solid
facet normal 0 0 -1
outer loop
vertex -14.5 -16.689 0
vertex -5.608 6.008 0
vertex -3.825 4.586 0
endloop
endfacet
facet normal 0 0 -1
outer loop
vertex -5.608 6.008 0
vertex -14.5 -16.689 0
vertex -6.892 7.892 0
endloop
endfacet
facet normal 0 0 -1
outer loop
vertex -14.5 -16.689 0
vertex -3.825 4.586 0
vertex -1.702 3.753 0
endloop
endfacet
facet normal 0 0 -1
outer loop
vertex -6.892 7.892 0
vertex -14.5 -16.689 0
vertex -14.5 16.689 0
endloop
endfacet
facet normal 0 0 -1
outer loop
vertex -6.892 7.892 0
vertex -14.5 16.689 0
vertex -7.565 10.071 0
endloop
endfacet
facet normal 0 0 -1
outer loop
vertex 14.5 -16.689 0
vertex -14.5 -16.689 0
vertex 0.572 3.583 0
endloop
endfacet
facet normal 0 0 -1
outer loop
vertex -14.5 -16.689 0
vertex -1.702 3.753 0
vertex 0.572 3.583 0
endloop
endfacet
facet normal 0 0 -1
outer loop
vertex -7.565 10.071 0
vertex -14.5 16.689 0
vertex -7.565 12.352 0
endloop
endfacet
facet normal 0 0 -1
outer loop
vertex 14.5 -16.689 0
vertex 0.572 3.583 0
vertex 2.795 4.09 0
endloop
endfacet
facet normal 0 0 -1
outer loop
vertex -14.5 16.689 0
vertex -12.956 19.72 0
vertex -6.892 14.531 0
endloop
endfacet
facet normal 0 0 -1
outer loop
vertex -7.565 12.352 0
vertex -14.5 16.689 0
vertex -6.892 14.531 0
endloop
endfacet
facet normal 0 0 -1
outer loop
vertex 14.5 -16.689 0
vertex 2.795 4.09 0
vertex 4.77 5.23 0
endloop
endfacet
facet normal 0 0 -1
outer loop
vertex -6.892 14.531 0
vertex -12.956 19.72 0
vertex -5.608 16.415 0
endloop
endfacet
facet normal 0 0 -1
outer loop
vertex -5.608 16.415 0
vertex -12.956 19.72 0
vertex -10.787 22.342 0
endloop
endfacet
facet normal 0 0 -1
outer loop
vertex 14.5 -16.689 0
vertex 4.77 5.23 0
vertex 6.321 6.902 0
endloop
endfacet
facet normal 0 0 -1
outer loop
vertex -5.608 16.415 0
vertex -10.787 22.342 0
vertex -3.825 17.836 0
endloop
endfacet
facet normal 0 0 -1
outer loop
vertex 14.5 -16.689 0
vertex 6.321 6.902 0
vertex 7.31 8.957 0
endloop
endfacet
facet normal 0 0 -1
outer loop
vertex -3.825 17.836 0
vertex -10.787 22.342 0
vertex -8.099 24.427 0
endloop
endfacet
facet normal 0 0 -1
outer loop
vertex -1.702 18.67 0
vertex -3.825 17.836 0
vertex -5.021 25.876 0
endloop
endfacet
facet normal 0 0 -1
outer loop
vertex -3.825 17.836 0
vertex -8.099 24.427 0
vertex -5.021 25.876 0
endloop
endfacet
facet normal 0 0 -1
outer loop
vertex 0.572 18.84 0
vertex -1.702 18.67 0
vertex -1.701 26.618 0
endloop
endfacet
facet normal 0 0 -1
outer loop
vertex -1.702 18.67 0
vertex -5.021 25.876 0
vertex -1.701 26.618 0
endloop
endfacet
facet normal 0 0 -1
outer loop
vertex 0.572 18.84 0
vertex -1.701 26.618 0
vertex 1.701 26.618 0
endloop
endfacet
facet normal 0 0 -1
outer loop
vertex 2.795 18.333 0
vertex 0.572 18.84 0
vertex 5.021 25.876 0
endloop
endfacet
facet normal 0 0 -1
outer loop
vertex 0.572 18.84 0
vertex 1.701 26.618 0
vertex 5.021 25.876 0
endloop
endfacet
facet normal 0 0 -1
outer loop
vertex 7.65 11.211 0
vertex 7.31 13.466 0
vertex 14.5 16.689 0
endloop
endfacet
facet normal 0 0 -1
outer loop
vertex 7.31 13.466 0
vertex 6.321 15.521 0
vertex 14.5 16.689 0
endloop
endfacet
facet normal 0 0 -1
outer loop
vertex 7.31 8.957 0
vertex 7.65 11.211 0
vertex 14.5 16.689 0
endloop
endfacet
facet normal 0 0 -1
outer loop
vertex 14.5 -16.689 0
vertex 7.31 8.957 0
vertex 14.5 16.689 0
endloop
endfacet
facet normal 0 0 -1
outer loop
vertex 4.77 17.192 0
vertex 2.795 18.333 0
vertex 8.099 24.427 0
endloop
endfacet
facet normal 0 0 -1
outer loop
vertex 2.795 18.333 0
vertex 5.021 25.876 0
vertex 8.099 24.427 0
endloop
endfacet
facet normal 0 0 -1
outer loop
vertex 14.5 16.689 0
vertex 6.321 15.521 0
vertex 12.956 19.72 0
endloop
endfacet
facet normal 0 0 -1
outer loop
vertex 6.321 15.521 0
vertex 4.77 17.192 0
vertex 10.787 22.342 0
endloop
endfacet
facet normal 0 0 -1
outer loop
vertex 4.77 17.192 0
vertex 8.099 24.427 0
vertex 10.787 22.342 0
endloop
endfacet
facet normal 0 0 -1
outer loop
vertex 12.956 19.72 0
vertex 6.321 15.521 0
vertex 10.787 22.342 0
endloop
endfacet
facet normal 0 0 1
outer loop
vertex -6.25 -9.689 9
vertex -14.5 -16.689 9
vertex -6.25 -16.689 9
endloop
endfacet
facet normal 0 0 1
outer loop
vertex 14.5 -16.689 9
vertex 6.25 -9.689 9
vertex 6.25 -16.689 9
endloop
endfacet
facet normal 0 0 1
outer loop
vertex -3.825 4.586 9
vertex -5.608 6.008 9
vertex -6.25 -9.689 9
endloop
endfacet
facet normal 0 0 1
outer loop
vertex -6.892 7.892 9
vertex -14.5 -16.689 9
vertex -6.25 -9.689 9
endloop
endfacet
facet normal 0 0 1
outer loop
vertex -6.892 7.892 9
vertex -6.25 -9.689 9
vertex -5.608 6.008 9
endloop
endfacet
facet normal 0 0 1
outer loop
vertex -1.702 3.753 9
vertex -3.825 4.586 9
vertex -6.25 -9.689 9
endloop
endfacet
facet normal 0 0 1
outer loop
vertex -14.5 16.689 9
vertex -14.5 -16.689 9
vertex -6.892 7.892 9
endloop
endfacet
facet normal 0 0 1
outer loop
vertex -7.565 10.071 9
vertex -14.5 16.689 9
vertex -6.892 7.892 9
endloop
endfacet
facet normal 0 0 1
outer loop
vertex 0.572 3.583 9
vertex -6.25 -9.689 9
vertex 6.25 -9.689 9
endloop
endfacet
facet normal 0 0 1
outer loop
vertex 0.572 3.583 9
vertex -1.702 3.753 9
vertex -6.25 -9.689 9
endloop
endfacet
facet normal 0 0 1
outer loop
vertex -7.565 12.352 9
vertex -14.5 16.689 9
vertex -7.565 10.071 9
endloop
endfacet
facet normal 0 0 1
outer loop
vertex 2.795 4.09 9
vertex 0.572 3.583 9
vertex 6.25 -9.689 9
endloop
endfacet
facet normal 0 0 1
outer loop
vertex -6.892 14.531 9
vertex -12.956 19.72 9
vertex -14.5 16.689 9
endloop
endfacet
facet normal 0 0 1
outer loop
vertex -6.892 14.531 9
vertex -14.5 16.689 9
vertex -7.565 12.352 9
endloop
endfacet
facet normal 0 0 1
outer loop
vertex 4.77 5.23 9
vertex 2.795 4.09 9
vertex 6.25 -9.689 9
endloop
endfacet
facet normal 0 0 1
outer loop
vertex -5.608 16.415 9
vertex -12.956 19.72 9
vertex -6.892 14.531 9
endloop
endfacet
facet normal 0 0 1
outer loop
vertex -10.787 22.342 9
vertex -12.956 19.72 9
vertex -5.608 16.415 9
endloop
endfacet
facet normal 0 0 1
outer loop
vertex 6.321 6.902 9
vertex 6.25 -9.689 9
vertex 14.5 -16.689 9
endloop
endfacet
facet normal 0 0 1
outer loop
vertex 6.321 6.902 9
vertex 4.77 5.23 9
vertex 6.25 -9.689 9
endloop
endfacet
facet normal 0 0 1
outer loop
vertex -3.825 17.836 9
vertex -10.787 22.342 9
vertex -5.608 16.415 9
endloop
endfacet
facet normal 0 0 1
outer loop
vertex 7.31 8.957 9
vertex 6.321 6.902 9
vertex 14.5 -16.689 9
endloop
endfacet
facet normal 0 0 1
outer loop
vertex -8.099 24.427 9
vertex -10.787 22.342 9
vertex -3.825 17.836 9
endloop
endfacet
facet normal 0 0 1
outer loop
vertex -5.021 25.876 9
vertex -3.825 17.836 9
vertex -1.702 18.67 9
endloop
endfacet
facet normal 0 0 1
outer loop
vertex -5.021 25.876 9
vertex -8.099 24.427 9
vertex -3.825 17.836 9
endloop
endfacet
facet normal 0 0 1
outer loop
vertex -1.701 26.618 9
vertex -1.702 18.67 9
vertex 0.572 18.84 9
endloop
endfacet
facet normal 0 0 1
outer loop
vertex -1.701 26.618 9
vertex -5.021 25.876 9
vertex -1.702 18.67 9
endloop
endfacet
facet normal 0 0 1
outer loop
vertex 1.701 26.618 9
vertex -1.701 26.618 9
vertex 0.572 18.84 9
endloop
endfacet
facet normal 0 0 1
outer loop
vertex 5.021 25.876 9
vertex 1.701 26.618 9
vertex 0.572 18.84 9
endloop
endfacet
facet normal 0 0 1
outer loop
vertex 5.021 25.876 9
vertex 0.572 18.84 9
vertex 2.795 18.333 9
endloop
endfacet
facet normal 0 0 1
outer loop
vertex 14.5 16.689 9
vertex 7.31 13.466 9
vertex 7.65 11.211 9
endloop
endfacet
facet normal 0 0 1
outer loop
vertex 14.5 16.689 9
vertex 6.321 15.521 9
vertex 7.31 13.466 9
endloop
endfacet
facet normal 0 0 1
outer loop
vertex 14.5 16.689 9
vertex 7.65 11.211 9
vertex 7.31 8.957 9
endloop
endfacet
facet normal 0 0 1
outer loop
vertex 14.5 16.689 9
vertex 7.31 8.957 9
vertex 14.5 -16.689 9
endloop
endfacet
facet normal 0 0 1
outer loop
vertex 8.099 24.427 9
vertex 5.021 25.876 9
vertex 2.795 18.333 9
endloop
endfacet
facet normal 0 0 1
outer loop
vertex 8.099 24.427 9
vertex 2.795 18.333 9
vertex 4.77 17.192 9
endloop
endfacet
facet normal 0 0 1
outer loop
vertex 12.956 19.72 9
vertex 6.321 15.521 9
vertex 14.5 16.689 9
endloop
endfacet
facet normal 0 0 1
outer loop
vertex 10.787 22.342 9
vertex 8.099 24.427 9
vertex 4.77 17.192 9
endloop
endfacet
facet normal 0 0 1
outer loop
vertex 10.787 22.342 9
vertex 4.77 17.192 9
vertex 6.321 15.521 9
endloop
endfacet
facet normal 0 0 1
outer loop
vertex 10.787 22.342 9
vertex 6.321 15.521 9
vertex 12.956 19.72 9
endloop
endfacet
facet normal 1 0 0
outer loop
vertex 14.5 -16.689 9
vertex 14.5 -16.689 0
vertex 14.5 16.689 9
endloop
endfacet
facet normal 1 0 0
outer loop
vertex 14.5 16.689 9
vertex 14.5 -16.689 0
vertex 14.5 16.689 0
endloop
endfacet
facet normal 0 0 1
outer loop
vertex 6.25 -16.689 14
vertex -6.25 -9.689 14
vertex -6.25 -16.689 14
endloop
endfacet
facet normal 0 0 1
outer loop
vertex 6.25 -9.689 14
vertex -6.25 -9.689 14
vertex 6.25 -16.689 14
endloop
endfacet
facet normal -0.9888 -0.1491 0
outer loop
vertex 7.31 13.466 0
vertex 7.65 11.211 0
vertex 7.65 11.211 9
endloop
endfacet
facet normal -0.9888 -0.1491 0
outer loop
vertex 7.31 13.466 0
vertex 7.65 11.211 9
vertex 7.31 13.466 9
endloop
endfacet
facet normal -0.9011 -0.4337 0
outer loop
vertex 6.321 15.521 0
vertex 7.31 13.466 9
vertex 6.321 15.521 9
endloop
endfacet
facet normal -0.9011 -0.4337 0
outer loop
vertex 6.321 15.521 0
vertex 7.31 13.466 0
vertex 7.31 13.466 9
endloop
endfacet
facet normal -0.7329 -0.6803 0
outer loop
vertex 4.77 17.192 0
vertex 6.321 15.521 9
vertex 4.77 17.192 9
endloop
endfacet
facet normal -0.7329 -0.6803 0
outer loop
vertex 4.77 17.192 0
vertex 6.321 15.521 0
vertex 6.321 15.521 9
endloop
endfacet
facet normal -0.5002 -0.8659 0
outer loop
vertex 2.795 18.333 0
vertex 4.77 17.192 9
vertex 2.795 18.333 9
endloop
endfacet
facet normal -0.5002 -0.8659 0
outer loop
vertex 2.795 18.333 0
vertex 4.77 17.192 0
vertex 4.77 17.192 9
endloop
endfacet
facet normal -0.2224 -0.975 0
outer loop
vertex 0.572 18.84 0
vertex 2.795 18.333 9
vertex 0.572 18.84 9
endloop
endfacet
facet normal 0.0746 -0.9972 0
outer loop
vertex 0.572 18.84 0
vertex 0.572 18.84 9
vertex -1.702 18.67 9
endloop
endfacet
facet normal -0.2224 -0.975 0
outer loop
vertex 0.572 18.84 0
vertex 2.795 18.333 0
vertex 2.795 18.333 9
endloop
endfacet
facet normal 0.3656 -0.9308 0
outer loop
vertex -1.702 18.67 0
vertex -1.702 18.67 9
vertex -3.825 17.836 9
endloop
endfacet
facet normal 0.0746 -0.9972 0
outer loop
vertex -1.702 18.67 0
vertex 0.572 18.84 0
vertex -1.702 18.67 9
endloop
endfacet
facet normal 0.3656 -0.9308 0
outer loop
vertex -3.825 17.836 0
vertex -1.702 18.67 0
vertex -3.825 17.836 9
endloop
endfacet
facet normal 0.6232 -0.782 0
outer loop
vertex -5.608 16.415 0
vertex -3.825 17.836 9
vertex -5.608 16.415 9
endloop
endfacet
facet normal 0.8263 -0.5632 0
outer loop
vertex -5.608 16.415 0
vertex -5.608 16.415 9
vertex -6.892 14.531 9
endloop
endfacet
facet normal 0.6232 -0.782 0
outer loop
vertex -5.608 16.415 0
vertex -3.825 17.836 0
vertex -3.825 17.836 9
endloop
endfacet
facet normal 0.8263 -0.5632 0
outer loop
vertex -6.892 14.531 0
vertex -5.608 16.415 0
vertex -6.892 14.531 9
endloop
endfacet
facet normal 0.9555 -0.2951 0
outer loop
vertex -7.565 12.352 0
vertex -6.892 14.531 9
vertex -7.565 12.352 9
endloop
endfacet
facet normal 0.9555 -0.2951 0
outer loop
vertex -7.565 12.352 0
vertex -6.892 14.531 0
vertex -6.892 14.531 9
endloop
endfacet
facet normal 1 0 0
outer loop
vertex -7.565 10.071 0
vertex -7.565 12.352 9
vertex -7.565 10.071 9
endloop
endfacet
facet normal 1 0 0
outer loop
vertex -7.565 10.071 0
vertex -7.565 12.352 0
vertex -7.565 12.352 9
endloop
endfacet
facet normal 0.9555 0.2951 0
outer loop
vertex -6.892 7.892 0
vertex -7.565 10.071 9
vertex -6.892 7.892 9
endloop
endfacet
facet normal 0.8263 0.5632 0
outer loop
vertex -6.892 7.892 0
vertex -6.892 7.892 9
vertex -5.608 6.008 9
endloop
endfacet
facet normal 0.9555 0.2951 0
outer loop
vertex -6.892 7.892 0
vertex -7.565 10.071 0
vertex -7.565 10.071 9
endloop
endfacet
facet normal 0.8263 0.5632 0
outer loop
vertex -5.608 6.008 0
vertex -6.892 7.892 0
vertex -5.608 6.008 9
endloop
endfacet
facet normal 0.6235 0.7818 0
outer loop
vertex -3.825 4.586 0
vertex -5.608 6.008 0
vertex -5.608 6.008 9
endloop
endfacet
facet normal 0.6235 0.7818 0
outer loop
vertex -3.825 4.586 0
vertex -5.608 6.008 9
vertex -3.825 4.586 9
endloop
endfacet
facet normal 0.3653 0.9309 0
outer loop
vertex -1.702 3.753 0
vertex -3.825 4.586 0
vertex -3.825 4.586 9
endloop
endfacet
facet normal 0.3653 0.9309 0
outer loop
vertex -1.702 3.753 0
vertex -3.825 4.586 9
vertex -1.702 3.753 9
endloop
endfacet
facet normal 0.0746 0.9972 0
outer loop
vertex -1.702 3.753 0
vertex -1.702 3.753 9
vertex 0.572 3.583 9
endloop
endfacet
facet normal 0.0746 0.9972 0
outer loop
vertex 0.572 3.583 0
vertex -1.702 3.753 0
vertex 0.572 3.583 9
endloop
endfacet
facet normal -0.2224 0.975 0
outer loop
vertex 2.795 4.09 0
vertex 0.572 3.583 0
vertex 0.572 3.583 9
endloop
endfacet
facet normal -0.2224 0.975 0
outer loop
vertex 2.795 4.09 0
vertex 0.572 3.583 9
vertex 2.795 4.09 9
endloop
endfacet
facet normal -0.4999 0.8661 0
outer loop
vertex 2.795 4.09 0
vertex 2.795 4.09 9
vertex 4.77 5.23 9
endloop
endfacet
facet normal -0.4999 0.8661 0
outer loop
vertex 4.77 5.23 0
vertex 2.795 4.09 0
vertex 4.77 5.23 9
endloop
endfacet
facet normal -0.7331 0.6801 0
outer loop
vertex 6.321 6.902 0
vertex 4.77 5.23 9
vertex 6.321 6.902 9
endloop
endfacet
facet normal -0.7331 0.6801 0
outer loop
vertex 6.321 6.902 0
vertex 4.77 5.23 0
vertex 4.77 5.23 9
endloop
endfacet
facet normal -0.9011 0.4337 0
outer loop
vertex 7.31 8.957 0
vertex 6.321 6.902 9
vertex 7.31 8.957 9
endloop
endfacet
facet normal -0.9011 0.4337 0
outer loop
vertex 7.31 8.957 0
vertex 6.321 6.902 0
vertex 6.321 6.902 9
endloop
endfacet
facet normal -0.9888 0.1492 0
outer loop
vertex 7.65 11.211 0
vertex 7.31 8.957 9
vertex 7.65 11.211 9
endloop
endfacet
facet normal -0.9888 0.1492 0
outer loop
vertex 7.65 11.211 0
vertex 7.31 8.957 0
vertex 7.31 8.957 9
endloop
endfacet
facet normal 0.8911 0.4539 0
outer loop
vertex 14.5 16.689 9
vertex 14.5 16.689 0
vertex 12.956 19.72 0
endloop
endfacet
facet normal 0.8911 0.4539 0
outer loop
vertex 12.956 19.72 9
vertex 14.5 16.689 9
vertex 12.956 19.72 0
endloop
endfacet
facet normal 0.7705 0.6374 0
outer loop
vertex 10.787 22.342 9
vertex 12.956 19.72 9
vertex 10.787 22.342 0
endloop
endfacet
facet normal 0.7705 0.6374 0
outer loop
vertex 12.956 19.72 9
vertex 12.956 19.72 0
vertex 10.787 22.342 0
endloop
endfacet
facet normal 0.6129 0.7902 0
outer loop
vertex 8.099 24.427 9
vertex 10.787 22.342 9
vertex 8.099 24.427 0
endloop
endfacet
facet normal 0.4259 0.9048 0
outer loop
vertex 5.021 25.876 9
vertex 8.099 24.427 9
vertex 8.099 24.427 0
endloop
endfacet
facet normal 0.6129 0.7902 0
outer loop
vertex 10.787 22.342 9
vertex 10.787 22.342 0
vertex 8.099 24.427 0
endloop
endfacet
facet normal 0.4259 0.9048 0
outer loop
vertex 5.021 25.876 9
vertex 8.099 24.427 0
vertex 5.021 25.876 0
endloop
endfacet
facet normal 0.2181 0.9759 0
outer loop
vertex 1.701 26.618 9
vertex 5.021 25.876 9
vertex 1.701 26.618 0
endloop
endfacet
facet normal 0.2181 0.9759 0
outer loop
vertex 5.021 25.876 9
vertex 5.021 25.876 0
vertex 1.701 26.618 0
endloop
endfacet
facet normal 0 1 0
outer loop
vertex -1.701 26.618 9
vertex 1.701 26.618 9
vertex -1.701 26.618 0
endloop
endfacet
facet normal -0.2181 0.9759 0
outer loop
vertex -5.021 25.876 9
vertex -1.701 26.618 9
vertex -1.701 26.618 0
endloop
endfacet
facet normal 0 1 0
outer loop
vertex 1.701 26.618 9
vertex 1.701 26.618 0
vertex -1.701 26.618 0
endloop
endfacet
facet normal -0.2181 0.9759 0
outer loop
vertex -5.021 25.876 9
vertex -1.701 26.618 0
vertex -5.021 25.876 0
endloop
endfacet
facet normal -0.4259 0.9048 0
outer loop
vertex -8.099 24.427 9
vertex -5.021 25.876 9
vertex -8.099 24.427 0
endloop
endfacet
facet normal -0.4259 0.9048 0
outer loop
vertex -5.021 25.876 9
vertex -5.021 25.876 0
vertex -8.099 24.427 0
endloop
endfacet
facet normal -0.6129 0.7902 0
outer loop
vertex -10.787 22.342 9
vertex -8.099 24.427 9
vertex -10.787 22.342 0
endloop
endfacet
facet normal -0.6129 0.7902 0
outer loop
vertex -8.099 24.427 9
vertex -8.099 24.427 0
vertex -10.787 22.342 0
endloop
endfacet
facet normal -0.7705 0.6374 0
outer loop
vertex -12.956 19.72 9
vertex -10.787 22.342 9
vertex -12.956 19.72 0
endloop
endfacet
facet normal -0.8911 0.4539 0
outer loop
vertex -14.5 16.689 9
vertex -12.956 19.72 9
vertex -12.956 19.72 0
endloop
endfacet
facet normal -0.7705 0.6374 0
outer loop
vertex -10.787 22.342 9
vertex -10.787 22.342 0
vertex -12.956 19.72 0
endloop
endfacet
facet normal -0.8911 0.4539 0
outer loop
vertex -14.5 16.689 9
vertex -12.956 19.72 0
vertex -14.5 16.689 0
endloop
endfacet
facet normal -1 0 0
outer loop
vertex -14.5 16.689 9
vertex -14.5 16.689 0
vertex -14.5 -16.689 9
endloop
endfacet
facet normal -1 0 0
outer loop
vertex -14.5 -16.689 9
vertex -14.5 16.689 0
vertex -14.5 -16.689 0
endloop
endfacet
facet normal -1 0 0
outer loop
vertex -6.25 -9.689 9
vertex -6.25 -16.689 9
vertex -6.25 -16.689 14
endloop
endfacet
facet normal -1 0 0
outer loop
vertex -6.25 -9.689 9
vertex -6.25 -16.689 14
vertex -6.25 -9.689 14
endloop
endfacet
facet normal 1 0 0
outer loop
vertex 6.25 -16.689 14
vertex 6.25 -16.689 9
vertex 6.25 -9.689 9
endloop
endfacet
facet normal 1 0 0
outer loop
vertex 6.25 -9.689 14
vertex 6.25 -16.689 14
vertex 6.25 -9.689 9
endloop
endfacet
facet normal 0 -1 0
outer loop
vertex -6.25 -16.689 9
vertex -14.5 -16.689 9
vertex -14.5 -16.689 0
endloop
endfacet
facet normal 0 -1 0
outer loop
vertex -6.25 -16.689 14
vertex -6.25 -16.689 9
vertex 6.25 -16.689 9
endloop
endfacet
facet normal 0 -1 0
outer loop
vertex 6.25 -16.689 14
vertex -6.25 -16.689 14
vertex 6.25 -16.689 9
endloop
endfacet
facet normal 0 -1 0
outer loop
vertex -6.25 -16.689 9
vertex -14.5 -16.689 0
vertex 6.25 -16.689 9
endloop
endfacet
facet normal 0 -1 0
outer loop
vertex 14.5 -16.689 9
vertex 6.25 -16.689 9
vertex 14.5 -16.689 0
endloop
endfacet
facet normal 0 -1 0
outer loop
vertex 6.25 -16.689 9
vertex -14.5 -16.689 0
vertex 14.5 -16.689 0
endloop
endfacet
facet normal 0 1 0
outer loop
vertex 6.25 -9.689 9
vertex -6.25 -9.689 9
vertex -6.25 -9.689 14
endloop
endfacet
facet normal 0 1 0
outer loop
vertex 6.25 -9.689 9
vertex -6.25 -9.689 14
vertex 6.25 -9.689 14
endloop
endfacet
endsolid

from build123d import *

# Parameters (mm, degrees)
SKETCH1_R           = 7.65
BOSS_EXTRUDE1_DEPTH = 9
SKETCH2_W           = 12.5
SKETCH2_H           = 7
BOSS_EXTRUDE2_DEPTH = 5


with BuildPart() as part:
    # Sketch1 → Boss-Extrude1 (new body)
    with BuildSketch(Plane.XY):
        with BuildLine():
            Line((-14.5, -16.688612788), (14.5, -16.688612788))
            Line((14.5, -16.688612788), (14.5, 16.688612788))
            ThreePointArc((14.5, 16.688612788), (0, 26.711387212), (-14.5, 16.688612788))
            Line((-14.5, 16.688612788), (-14.5, -16.688612788))
        make_face()
        with Locations((0, 11.211387212)):
            Circle(SKETCH1_R, mode=Mode.SUBTRACT)
    extrude(amount=BOSS_EXTRUDE1_DEPTH)

    # Sketch2 → Boss-Extrude2 (add)
    with BuildSketch(Plane.XY.offset(9)):
        with Locations((0, -13.188612788)):
            Rectangle(SKETCH2_W, SKETCH2_H)
    extrude(amount=BOSS_EXTRUDE2_DEPTH)


solid = part.part
